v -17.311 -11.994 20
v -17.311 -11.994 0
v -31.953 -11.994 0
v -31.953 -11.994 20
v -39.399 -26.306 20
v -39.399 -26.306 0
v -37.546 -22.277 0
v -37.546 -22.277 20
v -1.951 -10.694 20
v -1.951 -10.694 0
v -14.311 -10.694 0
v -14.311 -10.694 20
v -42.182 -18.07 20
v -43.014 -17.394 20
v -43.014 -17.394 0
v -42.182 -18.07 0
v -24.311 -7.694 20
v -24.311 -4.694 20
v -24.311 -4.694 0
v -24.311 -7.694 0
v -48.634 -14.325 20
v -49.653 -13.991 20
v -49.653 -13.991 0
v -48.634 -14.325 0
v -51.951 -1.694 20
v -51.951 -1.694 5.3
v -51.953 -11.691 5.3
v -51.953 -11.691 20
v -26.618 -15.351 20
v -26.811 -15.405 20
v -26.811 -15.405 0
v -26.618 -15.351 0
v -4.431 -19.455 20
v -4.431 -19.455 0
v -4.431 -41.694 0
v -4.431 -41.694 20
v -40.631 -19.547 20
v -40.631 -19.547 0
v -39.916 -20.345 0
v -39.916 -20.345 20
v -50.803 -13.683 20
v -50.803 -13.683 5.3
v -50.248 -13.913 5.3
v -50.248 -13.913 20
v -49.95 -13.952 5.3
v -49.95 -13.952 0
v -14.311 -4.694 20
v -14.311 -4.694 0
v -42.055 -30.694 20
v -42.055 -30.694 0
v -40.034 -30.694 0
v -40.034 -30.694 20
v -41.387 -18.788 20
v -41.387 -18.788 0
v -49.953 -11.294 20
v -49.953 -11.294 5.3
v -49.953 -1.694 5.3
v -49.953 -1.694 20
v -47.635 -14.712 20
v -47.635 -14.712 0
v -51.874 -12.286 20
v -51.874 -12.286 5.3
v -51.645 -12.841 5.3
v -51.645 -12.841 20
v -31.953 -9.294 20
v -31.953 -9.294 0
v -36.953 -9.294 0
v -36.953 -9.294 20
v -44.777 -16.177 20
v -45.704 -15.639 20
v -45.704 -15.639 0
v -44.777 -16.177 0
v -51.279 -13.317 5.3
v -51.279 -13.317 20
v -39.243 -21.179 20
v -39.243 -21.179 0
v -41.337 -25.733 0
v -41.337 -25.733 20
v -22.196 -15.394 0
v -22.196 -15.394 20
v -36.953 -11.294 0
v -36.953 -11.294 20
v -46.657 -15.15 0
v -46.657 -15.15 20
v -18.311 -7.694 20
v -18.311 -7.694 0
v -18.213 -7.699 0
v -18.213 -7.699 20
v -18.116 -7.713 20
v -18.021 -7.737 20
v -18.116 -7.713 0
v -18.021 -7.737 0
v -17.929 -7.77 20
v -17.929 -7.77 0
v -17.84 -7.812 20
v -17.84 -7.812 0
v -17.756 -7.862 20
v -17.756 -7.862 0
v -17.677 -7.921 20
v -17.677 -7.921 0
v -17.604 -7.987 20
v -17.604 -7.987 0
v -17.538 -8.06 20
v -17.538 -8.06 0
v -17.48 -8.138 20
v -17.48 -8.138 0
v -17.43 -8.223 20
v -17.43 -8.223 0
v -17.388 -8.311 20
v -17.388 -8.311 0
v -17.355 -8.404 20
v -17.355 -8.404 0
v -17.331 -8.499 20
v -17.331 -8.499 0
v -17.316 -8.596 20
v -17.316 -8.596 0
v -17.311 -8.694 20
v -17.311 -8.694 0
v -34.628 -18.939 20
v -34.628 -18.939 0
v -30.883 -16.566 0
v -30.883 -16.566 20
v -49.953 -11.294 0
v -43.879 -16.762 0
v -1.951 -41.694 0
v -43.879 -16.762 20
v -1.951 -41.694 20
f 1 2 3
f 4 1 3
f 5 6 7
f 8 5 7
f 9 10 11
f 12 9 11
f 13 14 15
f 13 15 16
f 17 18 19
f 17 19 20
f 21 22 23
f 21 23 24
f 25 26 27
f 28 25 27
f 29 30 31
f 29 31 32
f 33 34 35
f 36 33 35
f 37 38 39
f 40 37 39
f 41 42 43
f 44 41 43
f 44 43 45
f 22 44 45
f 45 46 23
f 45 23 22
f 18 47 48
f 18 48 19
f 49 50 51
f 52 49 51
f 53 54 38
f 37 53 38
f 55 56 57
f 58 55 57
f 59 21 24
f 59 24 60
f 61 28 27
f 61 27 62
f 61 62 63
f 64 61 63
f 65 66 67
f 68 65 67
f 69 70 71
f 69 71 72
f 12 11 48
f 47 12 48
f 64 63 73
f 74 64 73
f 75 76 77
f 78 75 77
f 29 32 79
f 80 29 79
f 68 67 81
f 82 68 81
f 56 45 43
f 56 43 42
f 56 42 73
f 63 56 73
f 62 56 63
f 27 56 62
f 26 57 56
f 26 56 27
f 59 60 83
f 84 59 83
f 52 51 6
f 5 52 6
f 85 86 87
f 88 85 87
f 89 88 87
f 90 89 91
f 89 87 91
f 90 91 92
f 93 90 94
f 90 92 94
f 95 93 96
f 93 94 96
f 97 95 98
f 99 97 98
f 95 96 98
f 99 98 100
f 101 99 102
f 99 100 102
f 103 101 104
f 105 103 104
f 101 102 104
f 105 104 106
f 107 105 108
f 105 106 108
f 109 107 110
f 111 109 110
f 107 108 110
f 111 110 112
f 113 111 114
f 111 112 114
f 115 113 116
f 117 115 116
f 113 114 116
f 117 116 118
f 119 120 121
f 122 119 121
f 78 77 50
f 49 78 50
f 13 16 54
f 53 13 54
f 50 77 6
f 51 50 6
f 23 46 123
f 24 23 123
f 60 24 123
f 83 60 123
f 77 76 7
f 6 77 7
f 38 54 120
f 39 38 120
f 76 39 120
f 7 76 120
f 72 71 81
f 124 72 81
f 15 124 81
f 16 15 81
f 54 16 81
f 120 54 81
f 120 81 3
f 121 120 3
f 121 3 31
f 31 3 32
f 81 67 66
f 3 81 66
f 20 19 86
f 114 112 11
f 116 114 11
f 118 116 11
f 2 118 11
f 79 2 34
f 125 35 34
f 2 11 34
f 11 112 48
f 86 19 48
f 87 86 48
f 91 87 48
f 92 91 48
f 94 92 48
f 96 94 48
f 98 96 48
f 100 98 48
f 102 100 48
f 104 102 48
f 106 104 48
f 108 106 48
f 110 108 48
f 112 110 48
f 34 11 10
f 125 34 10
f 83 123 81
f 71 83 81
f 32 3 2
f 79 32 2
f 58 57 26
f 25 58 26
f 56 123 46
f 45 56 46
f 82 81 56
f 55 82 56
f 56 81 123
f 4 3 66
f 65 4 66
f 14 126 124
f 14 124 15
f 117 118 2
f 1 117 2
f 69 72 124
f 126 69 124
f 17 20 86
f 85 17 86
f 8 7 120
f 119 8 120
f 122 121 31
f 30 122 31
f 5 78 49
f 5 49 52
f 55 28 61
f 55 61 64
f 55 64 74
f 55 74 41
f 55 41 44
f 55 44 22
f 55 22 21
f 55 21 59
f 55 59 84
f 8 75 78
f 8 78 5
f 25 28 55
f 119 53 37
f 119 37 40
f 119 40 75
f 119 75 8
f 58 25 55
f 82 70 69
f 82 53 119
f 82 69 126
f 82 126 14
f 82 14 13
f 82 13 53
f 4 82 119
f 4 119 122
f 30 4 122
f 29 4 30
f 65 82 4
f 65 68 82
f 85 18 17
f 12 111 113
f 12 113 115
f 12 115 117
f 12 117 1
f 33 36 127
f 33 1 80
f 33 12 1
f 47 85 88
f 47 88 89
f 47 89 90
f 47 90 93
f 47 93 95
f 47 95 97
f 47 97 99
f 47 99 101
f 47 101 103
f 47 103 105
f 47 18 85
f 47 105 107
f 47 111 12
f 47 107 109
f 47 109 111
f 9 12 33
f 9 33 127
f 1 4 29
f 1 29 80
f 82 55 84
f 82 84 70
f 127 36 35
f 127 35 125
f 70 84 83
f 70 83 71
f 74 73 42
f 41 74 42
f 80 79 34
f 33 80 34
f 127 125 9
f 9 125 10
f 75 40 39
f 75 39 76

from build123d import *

# Parameters (mm, degrees)
SALIENTE_EXTRUIR1_DEPTH = 20
CORTAR_EXTRUIR1_DEPTH   = 5.3


with BuildPart() as part:
    # Croquis3 → Saliente-Extruir1 (new body)
    with BuildSketch(Plane.XY):
        with BuildLine():
            Line((-51.952746953, -11.691023914), (-51.874375972, -12.286308051))
            Line((-51.874375972, -12.286308051), (-51.644609193, -12.841022845))
            Line((-51.644609193, -12.841022845), (-51.279094792, -13.317369615))
            Line((-51.279094792, -13.317369615), (-50.802748021, -13.68288106))
            Line((-50.802748021, -13.68288106), (-50.24803027, -13.912653752))
            Line((-50.24803027, -13.912653752), (-49.65250662, -13.99148306))
            Line((-49.65250662, -13.99148306), (-48.634298914, -14.325284182))
            Line((-48.634298914, -14.325284182), (-47.63492106, -14.711825449))
            Line((-47.63492106, -14.711825449), (-46.657105279, -15.15005123))
            Line((-46.657105279, -15.15005123), (-45.70351874, -15.638763962))
            Line((-45.70351874, -15.638763962), (-44.776769471, -16.17663006))
            Line((-44.776769471, -16.17663006), (-43.879382708, -16.762176963))
            Line((-43.879382708, -16.762176963), (-43.013812718, -17.393807919))
            Line((-43.013812718, -17.393807919), (-42.182430974, -18.069799027))
            Line((-42.182430974, -18.069799027), (-41.387496586, -18.788302193))
            Line((-41.387496586, -18.788302193), (-40.631179954, -19.547354003))
            Line((-40.631179954, -19.547354003), (-39.91556277, -20.344881636))
            Line((-39.91556277, -20.344881636), (-39.24257888, -21.178708777))
            Line((-39.24257888, -21.178708777), (-41.33719888, -25.732864397))
            Line((-41.33719888, -25.732864397), (-42.055027862, -30.693958319))
            Line((-42.055027862, -30.693958319), (-40.034201485, -30.693958319))
            Line((-40.034201485, -30.693958319), (-39.399249875, -26.305668328))
            Line((-39.399249875, -26.305668328), (-37.546478747, -22.277332194))
            Line((-37.546478747, -22.277332194), (-34.627863462, -18.93937864))
            Line((-34.627863462, -18.93937864), (-30.882804538, -16.565607853))
            Line((-30.882804538, -16.565607853), (-26.81051779, -15.405439974))
            Line((-26.81051779, -15.405439974), (-26.618493511, -15.3507305))
            Line((-26.618493511, -15.3507305), (-22.195772803, -15.394292275))
            Line((-22.195772803, -15.394292275), (-4.431072692, -19.454792623))
            Line((-4.431072692, -19.454792623), (-4.431072692, -41.693958205))
            Line((-4.431072692, -41.693958205), (-1.951072692, -41.693958205))
            Line((-1.951072692, -41.693958205), (-1.951072692, -10.693958394))
            Line((-1.951072692, -10.693958394), (-14.311475216, -10.693958394))
            Line((-14.311475216, -10.693958394), (-14.311475216, -4.693956642))
            Line((-14.311475216, -4.693956642), (-24.311475179, -4.693956642))
            Line((-24.311475179, -4.693956642), (-24.311475179, -7.693958997))
            Line((-24.311475179, -7.693958997), (-18.31147047, -7.693958997))
            ThreePointArc((-18.31147047, -7.693958997), (-17.604362437, -7.986851509), (-17.311465743, -8.69395781))
            Line((-17.311465743, -8.69395781), (-17.311465743, -11.993957443))
            Line((-17.311465743, -11.993957443), (-31.952510471, -11.993957443))
            Line((-31.952510471, -11.993957443), (-31.952510471, -9.293958281))
            Line((-31.952510471, -9.293958281), (-36.952504539, -9.293958281))
            Line((-36.952504539, -9.293958281), (-36.952504539, -11.293958865))
            Line((-36.952504539, -11.293958865), (-49.952506856, -11.293958865))
            Line((-49.952506856, -11.293958865), (-49.952506856, -1.693957245))
            Line((-49.952506856, -1.693957245), (-51.951481378, -1.69383601))
            Line((-51.951481378, -1.69383601), (-51.952746953, -11.691023914))
        make_face()
    extrude(amount=SALIENTE_EXTRUIR1_DEPTH)

    # Croquis4 → Cortar-Extruir1 (cut)
    with BuildSketch(Plane(origin=(0, 0, 0), x_dir=(-1, 0, 0), z_dir=(0, 0, -1))):
        Polygon((49.952506856, -11.293958865), (49.950268445, -13.952068406), (50.24803027, -13.912653752), (50.802748021, -13.68288106), (51.279094792, -13.317369615), (51.644609193, -12.841022845), (51.874375972, -12.286308051), (51.952746953, -11.691023914), (51.951481378, -1.69383601), (49.952506856, -1.693957245), align=None)
    extrude(amount=-CORTAR_EXTRUIR1_DEPTH, mode=Mode.SUBTRACT)


solid = part.part
